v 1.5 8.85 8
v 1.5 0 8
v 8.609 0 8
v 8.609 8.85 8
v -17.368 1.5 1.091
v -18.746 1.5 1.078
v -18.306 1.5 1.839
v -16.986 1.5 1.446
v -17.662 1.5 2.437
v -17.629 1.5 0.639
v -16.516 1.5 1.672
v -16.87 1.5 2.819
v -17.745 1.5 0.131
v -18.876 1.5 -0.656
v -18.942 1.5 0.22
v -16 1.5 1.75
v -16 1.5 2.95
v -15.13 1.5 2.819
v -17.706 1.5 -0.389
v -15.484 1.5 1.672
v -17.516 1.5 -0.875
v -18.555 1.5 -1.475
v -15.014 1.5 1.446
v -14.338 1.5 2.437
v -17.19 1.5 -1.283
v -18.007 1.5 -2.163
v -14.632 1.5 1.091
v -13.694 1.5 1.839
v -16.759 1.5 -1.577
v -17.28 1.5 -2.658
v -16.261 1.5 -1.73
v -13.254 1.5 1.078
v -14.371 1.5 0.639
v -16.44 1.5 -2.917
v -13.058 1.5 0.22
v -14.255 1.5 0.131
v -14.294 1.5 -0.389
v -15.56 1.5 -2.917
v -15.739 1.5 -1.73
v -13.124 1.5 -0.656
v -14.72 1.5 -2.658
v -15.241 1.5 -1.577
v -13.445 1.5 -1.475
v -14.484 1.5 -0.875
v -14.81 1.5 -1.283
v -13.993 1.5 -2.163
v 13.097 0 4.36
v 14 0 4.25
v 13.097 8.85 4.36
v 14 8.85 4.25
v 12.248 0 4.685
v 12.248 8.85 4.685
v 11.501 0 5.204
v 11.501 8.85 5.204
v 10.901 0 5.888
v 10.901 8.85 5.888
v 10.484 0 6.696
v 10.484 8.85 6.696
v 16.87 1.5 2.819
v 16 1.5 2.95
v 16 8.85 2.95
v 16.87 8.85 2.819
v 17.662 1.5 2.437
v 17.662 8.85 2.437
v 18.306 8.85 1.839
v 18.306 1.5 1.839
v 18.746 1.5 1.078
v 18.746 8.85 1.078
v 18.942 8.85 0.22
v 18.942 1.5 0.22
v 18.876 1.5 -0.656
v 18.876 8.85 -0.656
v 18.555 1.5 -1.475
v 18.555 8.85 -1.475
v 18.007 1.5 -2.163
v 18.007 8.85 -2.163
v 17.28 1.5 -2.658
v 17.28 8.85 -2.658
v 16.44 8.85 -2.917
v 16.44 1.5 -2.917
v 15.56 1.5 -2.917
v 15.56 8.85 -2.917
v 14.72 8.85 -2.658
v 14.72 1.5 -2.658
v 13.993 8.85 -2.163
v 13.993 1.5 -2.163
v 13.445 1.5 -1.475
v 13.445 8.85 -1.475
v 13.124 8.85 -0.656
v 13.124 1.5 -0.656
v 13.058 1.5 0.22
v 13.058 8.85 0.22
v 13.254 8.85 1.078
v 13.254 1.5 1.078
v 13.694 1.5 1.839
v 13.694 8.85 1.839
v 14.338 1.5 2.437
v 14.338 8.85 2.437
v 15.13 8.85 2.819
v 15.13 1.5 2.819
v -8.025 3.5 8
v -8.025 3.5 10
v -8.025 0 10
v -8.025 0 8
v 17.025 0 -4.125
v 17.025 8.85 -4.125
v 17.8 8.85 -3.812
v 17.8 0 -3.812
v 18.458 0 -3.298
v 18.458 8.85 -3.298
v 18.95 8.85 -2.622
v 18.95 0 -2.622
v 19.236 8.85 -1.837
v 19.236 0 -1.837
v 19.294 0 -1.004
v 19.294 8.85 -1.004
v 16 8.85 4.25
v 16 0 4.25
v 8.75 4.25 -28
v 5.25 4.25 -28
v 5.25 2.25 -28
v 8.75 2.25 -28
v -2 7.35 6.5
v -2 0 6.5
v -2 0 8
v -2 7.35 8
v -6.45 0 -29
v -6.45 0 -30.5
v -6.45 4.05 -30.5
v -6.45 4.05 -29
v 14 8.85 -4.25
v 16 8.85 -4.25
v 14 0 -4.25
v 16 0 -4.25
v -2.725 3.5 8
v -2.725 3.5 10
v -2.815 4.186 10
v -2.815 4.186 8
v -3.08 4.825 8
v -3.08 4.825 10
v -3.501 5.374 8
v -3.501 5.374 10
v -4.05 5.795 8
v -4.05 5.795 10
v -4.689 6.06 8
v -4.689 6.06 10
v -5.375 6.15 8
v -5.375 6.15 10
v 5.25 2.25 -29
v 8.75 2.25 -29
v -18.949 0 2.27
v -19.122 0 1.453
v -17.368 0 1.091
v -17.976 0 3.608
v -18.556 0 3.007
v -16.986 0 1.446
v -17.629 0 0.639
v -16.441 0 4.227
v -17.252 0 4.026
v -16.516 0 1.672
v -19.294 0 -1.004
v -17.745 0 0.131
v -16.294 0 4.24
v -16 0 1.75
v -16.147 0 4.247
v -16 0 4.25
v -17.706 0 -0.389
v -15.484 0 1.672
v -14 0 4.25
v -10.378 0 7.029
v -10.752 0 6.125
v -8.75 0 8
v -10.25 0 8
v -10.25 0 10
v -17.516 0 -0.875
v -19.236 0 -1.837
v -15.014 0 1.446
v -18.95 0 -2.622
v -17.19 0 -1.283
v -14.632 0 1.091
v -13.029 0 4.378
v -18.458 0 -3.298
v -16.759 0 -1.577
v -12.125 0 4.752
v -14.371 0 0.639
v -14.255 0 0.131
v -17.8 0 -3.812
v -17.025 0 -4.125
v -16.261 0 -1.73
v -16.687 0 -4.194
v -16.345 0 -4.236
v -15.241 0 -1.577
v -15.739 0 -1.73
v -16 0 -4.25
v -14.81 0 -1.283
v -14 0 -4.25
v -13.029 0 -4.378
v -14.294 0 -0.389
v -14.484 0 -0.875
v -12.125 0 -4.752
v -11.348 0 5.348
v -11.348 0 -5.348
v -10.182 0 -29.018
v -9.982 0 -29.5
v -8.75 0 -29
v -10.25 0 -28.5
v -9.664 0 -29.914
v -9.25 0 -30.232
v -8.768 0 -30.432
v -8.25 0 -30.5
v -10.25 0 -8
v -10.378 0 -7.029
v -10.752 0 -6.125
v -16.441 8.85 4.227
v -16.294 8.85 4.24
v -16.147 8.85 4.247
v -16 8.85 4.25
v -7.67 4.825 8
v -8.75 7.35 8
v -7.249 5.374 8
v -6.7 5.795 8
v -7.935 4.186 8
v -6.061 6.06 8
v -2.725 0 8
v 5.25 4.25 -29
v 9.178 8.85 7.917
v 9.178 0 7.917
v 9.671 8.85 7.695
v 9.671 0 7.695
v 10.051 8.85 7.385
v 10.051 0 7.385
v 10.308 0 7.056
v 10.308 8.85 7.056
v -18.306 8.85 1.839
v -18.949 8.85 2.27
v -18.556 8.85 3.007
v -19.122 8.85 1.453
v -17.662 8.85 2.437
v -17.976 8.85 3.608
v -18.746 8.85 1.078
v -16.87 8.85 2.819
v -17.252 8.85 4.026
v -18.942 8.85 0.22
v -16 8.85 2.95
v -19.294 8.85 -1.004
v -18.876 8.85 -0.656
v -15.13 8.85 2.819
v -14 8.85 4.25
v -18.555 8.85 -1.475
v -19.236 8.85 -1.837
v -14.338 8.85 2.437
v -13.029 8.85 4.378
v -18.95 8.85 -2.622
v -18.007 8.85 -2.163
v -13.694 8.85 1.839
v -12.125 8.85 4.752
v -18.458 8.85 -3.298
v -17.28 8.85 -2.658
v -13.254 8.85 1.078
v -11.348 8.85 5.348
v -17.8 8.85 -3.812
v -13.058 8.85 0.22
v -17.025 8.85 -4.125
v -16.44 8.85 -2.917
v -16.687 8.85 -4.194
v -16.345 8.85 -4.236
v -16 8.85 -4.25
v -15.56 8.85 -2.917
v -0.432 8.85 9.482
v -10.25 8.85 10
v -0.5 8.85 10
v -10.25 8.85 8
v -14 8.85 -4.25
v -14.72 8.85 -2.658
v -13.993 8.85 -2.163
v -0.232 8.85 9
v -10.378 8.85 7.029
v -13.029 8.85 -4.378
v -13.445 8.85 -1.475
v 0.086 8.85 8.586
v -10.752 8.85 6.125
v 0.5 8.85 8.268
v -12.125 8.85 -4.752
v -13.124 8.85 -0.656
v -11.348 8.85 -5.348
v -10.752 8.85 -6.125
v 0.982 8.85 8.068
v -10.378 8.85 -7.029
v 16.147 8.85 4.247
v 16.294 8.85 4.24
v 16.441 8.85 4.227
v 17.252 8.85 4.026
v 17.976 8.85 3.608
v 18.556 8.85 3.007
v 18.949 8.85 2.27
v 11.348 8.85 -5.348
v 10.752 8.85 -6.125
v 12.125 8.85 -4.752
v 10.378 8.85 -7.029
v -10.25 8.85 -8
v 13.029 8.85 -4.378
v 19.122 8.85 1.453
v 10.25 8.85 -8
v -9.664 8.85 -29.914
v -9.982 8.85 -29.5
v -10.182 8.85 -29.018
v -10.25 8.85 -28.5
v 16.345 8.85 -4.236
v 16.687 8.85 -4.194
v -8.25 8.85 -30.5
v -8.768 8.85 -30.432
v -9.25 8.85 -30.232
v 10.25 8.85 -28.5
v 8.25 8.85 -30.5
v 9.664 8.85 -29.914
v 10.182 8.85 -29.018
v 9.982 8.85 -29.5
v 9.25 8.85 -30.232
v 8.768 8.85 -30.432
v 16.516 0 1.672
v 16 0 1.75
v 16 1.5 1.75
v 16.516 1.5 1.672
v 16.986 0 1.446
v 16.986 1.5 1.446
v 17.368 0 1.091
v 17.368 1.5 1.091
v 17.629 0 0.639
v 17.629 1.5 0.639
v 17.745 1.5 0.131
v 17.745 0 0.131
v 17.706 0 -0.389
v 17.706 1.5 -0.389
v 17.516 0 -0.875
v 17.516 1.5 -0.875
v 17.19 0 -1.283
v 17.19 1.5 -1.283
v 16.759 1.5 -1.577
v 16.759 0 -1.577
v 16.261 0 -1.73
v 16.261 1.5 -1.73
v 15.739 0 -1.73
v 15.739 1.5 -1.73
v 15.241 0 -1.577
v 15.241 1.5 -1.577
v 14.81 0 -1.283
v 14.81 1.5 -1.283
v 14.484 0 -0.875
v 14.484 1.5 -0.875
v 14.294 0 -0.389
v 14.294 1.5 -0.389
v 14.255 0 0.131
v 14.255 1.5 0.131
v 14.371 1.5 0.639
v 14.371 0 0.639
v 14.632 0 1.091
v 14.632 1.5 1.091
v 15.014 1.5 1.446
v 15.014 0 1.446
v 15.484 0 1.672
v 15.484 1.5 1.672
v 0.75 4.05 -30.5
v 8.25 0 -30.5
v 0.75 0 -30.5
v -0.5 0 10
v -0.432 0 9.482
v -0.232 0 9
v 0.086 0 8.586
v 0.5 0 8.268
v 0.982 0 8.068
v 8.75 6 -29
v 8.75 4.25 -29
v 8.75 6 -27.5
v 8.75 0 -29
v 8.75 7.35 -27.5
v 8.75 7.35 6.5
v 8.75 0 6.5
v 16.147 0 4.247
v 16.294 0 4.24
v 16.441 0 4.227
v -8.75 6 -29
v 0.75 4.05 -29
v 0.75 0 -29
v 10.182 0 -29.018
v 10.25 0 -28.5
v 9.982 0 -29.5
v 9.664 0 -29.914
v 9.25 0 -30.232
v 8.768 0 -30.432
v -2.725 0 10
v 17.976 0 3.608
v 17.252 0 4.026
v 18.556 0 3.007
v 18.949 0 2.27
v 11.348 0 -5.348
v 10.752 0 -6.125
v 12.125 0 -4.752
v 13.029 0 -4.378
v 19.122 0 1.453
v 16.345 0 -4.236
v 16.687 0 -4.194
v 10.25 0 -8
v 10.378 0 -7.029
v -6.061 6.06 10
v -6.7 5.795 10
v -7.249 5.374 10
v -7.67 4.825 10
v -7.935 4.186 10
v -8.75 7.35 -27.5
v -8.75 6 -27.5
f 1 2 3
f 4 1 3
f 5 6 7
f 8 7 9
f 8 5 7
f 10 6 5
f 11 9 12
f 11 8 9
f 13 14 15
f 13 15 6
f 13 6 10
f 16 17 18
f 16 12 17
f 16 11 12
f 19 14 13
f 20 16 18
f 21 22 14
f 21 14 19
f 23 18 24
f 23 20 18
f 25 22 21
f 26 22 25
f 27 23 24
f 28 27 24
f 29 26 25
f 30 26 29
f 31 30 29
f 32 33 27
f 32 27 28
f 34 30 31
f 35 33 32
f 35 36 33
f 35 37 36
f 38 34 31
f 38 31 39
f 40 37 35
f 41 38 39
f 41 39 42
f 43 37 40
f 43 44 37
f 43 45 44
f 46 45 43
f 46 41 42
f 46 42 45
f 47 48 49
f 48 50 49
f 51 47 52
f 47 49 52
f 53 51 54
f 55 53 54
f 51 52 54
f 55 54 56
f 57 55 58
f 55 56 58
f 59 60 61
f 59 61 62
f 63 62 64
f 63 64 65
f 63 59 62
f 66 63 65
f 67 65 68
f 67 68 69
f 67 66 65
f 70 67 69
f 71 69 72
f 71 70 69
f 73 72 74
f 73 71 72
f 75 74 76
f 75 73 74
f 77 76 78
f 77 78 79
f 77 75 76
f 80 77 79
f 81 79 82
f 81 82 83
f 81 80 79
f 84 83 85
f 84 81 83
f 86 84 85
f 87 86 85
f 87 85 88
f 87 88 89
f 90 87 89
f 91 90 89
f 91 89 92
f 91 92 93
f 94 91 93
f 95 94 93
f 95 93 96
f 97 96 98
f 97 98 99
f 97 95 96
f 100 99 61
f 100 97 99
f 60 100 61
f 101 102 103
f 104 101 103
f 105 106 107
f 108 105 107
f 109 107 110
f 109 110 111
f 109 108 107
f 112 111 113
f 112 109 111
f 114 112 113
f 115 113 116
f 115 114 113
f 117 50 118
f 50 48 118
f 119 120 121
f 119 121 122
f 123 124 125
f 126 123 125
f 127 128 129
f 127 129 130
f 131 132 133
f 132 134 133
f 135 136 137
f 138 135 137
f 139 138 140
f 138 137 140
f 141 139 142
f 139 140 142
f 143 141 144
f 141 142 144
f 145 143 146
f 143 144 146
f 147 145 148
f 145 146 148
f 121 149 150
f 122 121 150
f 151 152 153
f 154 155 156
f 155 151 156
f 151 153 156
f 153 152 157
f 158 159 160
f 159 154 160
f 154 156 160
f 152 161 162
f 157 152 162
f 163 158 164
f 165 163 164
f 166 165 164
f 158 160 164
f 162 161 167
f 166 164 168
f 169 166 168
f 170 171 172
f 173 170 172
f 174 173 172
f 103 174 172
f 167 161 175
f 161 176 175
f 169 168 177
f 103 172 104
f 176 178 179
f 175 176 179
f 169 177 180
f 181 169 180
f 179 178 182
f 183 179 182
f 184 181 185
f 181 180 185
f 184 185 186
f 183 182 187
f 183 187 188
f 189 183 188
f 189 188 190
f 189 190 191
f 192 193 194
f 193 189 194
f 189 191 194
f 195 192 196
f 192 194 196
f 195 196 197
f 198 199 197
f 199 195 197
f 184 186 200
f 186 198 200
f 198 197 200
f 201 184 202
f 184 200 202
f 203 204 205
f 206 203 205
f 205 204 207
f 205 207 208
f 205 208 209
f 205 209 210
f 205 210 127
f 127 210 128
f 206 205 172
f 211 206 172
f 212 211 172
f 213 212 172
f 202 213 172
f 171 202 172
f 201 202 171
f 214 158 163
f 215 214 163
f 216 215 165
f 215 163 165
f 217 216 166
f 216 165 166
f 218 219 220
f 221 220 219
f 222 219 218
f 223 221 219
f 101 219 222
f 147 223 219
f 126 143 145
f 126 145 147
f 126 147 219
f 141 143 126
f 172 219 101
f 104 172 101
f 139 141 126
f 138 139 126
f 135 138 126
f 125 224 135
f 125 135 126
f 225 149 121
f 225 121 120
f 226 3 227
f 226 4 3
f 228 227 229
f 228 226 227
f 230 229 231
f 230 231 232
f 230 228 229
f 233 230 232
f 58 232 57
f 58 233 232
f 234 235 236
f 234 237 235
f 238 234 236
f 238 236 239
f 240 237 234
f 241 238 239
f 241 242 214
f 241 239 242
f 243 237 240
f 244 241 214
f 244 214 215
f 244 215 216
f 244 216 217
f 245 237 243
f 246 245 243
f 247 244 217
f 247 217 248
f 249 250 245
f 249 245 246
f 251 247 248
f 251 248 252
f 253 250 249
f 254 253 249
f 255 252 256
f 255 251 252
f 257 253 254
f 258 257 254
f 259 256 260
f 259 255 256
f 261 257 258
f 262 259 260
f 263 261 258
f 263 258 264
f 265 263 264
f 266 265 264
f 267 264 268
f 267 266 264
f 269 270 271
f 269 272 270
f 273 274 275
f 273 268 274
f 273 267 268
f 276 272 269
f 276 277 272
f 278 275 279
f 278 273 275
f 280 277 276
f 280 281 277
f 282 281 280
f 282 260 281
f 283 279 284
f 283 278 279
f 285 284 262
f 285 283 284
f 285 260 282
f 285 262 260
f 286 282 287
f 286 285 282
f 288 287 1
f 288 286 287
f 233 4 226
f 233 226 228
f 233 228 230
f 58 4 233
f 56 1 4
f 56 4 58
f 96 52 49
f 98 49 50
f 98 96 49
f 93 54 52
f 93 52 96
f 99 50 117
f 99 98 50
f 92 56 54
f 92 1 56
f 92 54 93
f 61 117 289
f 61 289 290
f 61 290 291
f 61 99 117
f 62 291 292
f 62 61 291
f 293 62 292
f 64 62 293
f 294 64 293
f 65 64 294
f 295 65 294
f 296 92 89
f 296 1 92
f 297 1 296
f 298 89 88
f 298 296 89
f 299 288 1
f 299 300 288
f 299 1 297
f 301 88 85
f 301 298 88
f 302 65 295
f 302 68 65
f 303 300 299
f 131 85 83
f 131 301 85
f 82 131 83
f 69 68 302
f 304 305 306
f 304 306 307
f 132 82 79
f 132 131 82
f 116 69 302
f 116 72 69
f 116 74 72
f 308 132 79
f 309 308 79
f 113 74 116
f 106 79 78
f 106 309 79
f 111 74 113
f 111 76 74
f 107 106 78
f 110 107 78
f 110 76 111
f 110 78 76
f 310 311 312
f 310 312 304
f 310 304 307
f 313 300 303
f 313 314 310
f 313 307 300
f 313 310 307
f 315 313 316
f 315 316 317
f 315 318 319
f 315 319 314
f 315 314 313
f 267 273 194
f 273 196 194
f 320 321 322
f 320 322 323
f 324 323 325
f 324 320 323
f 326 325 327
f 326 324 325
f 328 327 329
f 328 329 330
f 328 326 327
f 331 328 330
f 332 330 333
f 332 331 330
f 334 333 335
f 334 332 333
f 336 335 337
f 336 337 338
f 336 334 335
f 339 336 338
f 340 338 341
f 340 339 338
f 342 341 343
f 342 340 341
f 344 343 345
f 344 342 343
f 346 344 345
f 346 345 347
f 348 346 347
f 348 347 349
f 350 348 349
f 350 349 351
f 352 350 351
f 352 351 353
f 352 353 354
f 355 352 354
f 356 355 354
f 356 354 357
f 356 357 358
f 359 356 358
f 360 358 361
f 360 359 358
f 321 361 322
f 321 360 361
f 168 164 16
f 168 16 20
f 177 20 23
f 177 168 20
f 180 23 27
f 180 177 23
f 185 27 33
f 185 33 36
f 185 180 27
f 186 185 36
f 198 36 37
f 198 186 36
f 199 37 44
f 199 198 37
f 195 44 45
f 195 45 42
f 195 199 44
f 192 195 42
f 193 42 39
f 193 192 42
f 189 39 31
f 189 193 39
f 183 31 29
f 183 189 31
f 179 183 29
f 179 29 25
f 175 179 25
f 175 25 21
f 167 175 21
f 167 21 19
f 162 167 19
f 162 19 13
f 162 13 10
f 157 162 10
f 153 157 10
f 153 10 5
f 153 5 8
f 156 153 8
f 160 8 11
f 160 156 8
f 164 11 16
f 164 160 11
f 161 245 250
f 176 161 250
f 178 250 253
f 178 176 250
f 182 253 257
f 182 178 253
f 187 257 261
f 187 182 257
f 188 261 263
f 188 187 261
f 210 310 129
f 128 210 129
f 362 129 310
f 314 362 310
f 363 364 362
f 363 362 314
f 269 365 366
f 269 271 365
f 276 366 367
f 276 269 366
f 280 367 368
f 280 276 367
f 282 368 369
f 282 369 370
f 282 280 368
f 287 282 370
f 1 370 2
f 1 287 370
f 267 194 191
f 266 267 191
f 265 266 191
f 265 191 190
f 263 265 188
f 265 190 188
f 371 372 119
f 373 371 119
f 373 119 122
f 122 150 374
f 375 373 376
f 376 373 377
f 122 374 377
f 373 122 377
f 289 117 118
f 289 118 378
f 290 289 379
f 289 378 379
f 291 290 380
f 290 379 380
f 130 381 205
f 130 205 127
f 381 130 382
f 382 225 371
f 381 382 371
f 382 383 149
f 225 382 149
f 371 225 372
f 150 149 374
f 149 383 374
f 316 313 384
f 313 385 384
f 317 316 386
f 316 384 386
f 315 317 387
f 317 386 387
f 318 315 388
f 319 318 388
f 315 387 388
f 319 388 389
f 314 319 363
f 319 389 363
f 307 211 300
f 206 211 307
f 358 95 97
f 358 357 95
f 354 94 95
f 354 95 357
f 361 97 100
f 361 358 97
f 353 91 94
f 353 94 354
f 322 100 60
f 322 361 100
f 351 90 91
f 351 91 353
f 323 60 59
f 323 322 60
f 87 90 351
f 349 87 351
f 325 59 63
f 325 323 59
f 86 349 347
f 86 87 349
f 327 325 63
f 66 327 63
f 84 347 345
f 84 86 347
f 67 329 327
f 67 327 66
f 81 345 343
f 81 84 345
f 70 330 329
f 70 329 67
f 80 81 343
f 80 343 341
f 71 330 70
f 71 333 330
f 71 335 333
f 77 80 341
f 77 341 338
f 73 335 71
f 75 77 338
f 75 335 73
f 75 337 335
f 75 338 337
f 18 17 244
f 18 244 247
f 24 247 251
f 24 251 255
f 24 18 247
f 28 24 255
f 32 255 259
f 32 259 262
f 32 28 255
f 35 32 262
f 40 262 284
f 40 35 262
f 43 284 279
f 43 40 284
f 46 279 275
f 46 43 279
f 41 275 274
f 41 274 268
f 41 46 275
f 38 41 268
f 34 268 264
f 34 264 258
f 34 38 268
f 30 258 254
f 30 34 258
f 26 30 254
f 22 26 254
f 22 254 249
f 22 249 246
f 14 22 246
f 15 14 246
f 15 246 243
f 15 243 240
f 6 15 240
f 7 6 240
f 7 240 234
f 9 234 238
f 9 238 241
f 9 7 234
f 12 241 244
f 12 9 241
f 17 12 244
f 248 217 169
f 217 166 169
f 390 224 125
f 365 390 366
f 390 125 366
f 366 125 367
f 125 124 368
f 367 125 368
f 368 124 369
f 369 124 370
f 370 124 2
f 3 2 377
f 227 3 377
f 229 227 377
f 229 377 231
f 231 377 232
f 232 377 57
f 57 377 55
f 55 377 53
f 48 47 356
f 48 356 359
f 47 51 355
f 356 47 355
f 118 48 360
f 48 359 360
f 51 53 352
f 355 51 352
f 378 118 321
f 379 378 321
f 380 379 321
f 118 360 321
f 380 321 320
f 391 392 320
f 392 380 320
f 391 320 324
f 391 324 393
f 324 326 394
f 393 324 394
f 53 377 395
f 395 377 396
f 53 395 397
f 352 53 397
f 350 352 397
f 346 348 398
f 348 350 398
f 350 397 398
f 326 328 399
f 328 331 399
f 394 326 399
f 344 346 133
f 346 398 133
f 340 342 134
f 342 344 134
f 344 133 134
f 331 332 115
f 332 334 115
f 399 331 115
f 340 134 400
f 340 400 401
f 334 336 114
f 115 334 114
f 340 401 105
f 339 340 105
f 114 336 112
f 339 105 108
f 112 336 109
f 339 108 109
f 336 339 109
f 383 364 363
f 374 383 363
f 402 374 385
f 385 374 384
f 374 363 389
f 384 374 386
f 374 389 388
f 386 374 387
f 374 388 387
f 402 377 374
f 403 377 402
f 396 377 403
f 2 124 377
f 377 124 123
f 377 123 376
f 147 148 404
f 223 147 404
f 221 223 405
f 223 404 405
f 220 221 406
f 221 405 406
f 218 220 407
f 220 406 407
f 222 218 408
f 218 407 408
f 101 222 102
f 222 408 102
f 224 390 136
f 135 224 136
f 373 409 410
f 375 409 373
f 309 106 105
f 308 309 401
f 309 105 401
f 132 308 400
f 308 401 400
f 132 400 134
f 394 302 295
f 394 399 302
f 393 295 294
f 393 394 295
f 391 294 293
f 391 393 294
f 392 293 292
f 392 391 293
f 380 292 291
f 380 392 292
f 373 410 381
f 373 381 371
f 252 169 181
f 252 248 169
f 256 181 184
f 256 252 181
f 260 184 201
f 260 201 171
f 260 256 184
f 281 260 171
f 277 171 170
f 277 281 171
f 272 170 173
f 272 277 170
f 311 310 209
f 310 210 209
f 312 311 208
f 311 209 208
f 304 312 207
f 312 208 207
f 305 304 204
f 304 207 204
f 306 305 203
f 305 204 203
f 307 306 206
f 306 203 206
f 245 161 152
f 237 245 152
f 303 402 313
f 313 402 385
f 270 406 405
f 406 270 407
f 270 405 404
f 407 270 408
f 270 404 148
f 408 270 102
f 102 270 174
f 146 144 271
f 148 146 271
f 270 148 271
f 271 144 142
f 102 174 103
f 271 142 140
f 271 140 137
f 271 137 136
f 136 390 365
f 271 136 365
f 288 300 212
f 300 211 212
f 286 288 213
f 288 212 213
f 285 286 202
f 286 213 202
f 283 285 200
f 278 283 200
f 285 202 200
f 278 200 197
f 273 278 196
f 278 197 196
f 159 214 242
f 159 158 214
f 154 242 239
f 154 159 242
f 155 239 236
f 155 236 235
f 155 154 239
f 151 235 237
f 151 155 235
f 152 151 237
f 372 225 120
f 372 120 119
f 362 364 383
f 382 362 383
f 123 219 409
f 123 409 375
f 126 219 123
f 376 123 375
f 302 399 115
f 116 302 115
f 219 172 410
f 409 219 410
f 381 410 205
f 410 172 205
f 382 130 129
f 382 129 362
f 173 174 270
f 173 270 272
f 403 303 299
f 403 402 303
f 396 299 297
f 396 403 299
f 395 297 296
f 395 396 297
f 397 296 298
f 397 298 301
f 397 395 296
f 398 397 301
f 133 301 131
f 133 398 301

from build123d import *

# Parameters (mm, degrees)
SKETCH1_W           = 20.5
SKETCH1_H           = 38.5
SKETCH1_R           = 4.25
SKETCH1_R_2         = 1.75
BOSS_EXTRUDE1_DEPTH = 1.5
SKETCH2_W           = 20.5
SKETCH2_H           = 38.5
BOSS_EXTRUDE2_DEPTH = 7.35
SKETCH3_W           = 17.5
SKETCH3_H           = 35.5
SKETCH3_W_2         = 6.75
SKETCH3_H_2         = 1.5
CUT_EXTRUDE1_DEPTH  = 7.35
SKETCH4_W           = 7.2
SKETCH4_H           = 1.5
CUT_EXTRUDE2_DEPTH  = 4.05
SKETCH6_W           = 17.5
SKETCH6_H           = 1.5
BOSS_EXTRUDE3_DEPTH = 1.35
SKETCH7_W           = 3.5
SKETCH7_H           = 2
BOSS_EXTRUDE4_DEPTH = 1
SKETCH8_R           = 2.95
BOSS_EXTRUDE5_DEPTH = 7.35
FILLET2_R           = 3.75
CUT_EXTRUDE4_START  = -8.85
CUT_EXTRUDE4_DEPTH  = 8.85
FILLET5_R           = 3
SKETCH10_W          = 9.75
SKETCH10_H          = 2
BOSS_EXTRUDE6_DEPTH = 8.85
CUT_EXTRUDE5_REACH  = 47.729
FILLET4_R           = 2


with BuildPart() as part:
    # Sketch1 → Boss-Extrude1 (new body)
    # profile 1 of 5: a face of its own
    with BuildSketch(Plane(origin=(0, 0, 0), x_dir=(1, 0, 0), z_dir=(0, 1, 0))):
        with Locations((0, 11.25)):
            Rectangle(SKETCH1_W, SKETCH1_H)
    # profile 2 of 5: a face of its own
    with BuildSketch(Plane(origin=(0, 0, 0), x_dir=(1, 0, 0), z_dir=(0, 1, 0))):
        with BuildLine():
            Line((-10.25, -4.25), (-10.25, 4.25))
            Line((-10.25, 4.25), (-16, 4.25))
            ThreePointArc((-16, 4.25), (-12.99479618, 3.00520382), (-11.75, 0))
            ThreePointArc((-11.75, 0), (-12.99479618, -3.00520382), (-16, -4.25))
            Line((-16, -4.25), (-10.25, -4.25))
        make_face()
    # profile 3 of 5: a face of its own
    with BuildSketch(Plane(origin=(0, 0, 0), x_dir=(1, 0, 0), z_dir=(0, 1, 0))):
        with Locations((-16, 0)):
            Circle(SKETCH1_R)
        with Locations(Location((-16, 0, 0), (0, 0, 270))):
            Circle(SKETCH1_R_2, mode=Mode.SUBTRACT)
    # profile 4 of 5: a face of its own
    with BuildSketch(Plane(origin=(0, 0, 0), x_dir=(1, 0, 0), z_dir=(0, 1, 0))):
        with BuildLine():
            Line((16, 4.25), (10.25, 4.25))
            Line((10.25, 4.25), (10.25, -4.25))
            Line((10.25, -4.25), (16, -4.25))
            ThreePointArc((16, -4.25), (11.75, 0), (16, 4.25))
        make_face()
    # profile 5 of 5: a face of its own
    with BuildSketch(Plane(origin=(0, 0, 0), x_dir=(1, 0, 0), z_dir=(0, 1, 0))):
        with Locations((16, 0)):
            Circle(SKETCH1_R)
        with Locations(Location((16, 0, 0), (0, 0, 270))):
            Circle(SKETCH1_R_2, mode=Mode.SUBTRACT)
    extrude(amount=BOSS_EXTRUDE1_DEPTH)

    # Sketch2 → Boss-Extrude2 (add)
    with BuildSketch(Plane(origin=(0, 1.5, 0), x_dir=(1, 0, 0), z_dir=(0, 1, 0))):
        with Locations((0, 11.25)):
            Rectangle(SKETCH2_W, SKETCH2_H)
    extrude(amount=BOSS_EXTRUDE2_DEPTH)

    # Sketch3 → Cut-Extrude1 (cut)
    with BuildSketch(Plane.XZ):
        with Locations((0, -11.25)):
            Rectangle(SKETCH3_W, SKETCH3_H)
        with Locations((-5.375, 7.25)):
            Rectangle(SKETCH3_W_2, SKETCH3_H_2)
    extrude(amount=-CUT_EXTRUDE1_DEPTH, mode=Mode.SUBTRACT)

    # Sketch4 → Cut-Extrude2 (cut)
    with BuildSketch(Plane.XZ):
        with Locations((-2.85, -29.75)):
            Rectangle(SKETCH4_W, SKETCH4_H)
    extrude(amount=-CUT_EXTRUDE2_DEPTH, mode=Mode.SUBTRACT)

    # Sketch6 → Boss-Extrude3 (add)
    with BuildSketch(Plane.XZ.offset(-7.35)):
        with Locations((0, -28.25)):
            Rectangle(SKETCH6_W, SKETCH6_H)
    extrude(amount=BOSS_EXTRUDE3_DEPTH)

    # Sketch7 → Boss-Extrude4 (add)
    with BuildSketch(Plane.XY.offset(-29)):
        with Locations((7, 3.25)):
            Rectangle(SKETCH7_W, SKETCH7_H)
    extrude(amount=BOSS_EXTRUDE4_DEPTH)

    # Sketch8 → Boss-Extrude5 (add)
    # profile 1 of 2: a face of its own
    with BuildSketch(Plane(origin=(0, 1.5, 0), x_dir=(1, 0, 0), z_dir=(0, 1, 0))):
        with BuildLine():
            Line((-10.25, -4.25), (-10.25, 4.25))
            Line((-10.25, 4.25), (-16, 4.25))
            ThreePointArc((-16, 4.25), (-20.25, 0), (-16, -4.25))
            Line((-16, -4.25), (-10.25, -4.25))
        make_face()
        with Locations(Location((-16, 0, 0), (0, 0, 270))):
            Circle(SKETCH8_R, mode=Mode.SUBTRACT)
    # profile 2 of 2: a face of its own
    with BuildSketch(Plane(origin=(0, 1.5, 0), x_dir=(1, 0, 0), z_dir=(0, 1, 0))):
        with BuildLine():
            Line((10.25, 4.25), (10.25, -4.25))
            Line((10.25, -4.25), (16, -4.25))
            ThreePointArc((16, -4.25), (20.25, 0), (16, 4.25))
            Line((16, 4.25), (10.25, 4.25))
        make_face()
        with Locations(Location((16, 0, 0), (0, 0, 270))):
            Circle(SKETCH8_R, mode=Mode.SUBTRACT)
    extrude(amount=BOSS_EXTRUDE5_DEPTH)

    # Fillet2
    fillet2_edges = [part.edges().sort_by_distance(p)[0] for p in [
        (10.25, 4.425, -4.25),
        (10.25, 4.425, 4.25),
        (-10.25, 4.425, 4.25),
        (-10.25, 4.425, -4.25),
    ]]
    fillet(fillet2_edges, radius=FILLET2_R - 0.0001)  # a hair under: the kernel refuses the full size

    # Sketch9 → Cut-Extrude4 (cut)
    with BuildSketch(Plane(origin=(0, 8.85, 0), x_dir=(1, 0, 0), z_dir=(0, 1, 0)).offset(CUT_EXTRUDE4_START)):
        with BuildLine():
            Line((-24.982948352, 53.686308531), (-20.952771504, -3.947905519))
            ThreePointArc((-20.952771504, -3.947905519), (-19.171836931, -8.143524448), (-15.185360396, -10.353264474))
            Line((-15.185360396, -10.353264474), (-1.215537244, -12.816521212))
            ThreePointArc((-1.215537244, -12.816521212), (0, -12.922866941), (1.215537244, -12.816521212))
            Line((1.215537244, -12.816521212), (15.185360396, -10.353264474))
            ThreePointArc((15.185360396, -10.353264474), (19.171836931, -8.143524448), (20.952771504, -3.947905519))
            Line((20.952771504, -3.947905519), (24.982948352, 53.686308531))
            ThreePointArc((24.982948352, 53.686308531), (24.995735789, 53.930307371), (25, 54.174603847))
            Line((25, 54.174603847), (25, 107.825396153))
            ThreePointArc((25, 107.825396153), (24.995735789, 108.069692629), (24.982948352, 108.313691469))
            Line((24.982948352, 108.313691469), (20.952771504, 165.947905519))
            ThreePointArc((20.952771504, 165.947905519), (19.171836931, 170.143524448), (15.185360396, 172.353264474))
            Line((15.185360396, 172.353264474), (1.215537244, 174.816521212))
            ThreePointArc((1.215537244, 174.816521212), (0, 174.922866941), (-1.215537244, 174.816521212))
            Line((-1.215537244, 174.816521212), (-15.185360396, 172.353264474))
            ThreePointArc((-15.185360396, 172.353264474), (-19.171836931, 170.143524448), (-20.952771504, 165.947905519))
            Line((-20.952771504, 165.947905519), (-24.982948352, 108.313691469))
            ThreePointArc((-24.982948352, 108.313691469), (-24.995735789, 108.069692629), (-25, 107.825396153))
            Line((-25, 107.825396153), (-25, 54.174603847))
            ThreePointArc((-25, 54.174603847), (-24.995735789, 53.930307371), (-24.982948352, 53.686308531))
        make_face()
        with BuildLine():
            Line((-18.957643404, 165.808392572), (-22.987820251, 108.174178521))
            ThreePointArc((-22.987820251, 108.174178521), (-22.996954135, 107.999893636), (-23, 107.825396153))
            Line((-23, 107.825396153), (-23, 54.174603847))
            ThreePointArc((-23, 54.174603847), (-22.996954135, 54.000106364), (-22.987820251, 53.825821479))
            Line((-22.987820251, 53.825821479), (-18.957643404, -3.808392572))
            ThreePointArc((-18.957643404, -3.808392572), (-17.68554728, -6.805263235), (-14.838064041, -8.383648968))
            Line((-14.838064041, -8.383648968), (-0.868240888, -10.846905706))
            ThreePointArc((-0.868240888, -10.846905706), (0, -10.922866941), (0.868240888, -10.846905706))
            Line((0.868240888, -10.846905706), (14.838064041, -8.383648968))
            ThreePointArc((14.838064041, -8.383648968), (17.68554728, -6.805263235), (18.957643404, -3.808392572))
            Line((18.957643404, -3.808392572), (22.987820251, 53.825821479))
            ThreePointArc((22.987820251, 53.825821479), (22.996954135, 54.000106364), (23, 54.174603847))
            Line((23, 54.174603847), (23, 107.825396153))
            ThreePointArc((23, 107.825396153), (22.996954135, 107.999893636), (22.987820251, 108.174178521))
            Line((22.987820251, 108.174178521), (18.957643404, 165.808392572))
            ThreePointArc((18.957643404, 165.808392572), (17.68554728, 168.805263235), (14.838064041, 170.383648968))
            Line((14.838064041, 170.383648968), (0.868240888, 172.846905706))
            ThreePointArc((0.868240888, 172.846905706), (0, 172.922866941), (-0.868240888, 172.846905706))
            Line((-0.868240888, 172.846905706), (-14.838064041, 170.383648968))
            ThreePointArc((-14.838064041, 170.383648968), (-17.68554728, 168.805263235), (-18.957643404, 165.808392572))
        make_face(mode=Mode.SUBTRACT)
    extrude(amount=CUT_EXTRUDE4_DEPTH, mode=Mode.SUBTRACT)

    # Fillet5
    fillet5_edges = [part.edges().sort_by_distance(p)[0] for p in [
        (-19.402072162, 4.425, -2.547234776),
        (-19.014456867, 4.425, 2.995922195),
        (19.014456867, 4.425, 2.995922195),
        (19.402072162, 4.425, -2.547234776),
    ]]
    fillet(fillet5_edges, radius=FILLET5_R)

    # Sketch10 → Boss-Extrude6 (add)
    with BuildSketch(Plane(origin=(0, 0, 0), x_dir=(1, 0, 0), z_dir=(0, 1, 0))):
        with Locations((-5.375, -9)):
            Rectangle(SKETCH10_W, SKETCH10_H)
    extrude(amount=BOSS_EXTRUDE6_DEPTH)

    # Sketch11 → Cut-Extrude5 (cut, up to next)
    with BuildSketch(Plane.XY.offset(10), mode=Mode.PRIVATE) as cut_extrude5_sk1:
        with BuildLine():
            ThreePointArc((-2.725, 3.5), (-3.50116703, 5.37383297), (-5.375, 6.15))
            Line((-5.375, 6.15), (-5.375, 0.85))
            ThreePointArc((-5.375, 0.85), (-3.50116703, 1.62616703), (-2.725, 3.5))
        make_face()
    cut_extrude5_tool1 = extrude(cut_extrude5_sk1.sketch, amount=-CUT_EXTRUDE5_REACH, mode=Mode.PRIVATE) & part.part
    # Sketch11 → Cut-Extrude5 (cut, up to next)
    with BuildSketch(Plane.XY.offset(10), mode=Mode.PRIVATE) as cut_extrude5_sk2:
        with BuildLine():
            Line((-5.375, 0.85), (-5.375, 6.15))
            ThreePointArc((-5.375, 6.15), (-7.24883297, 5.37383297), (-8.025, 3.5))
            ThreePointArc((-8.025, 3.5), (-7.24883297, 1.62616703), (-5.375, 0.85))
        make_face()
    cut_extrude5_tool2 = extrude(cut_extrude5_sk2.sketch, amount=-CUT_EXTRUDE5_REACH, mode=Mode.PRIVATE) & part.part
    # Sketch11 → Cut-Extrude5 (cut, up to next)
    with BuildSketch(Plane.XY.offset(10), mode=Mode.PRIVATE) as cut_extrude5_sk3:
        with BuildLine():
            ThreePointArc((-2.725, 3.5), (-3.50116703, 5.37383297), (-5.375, 6.15))
            Line((-5.375, 6.15), (-5.375, 0.85))
            ThreePointArc((-5.375, 0.85), (-3.50116703, 1.62616703), (-2.725, 3.5))
        make_face()
    cut_extrude5_tool3 = extrude(cut_extrude5_sk3.sketch, amount=-CUT_EXTRUDE5_REACH, mode=Mode.PRIVATE) & part.part
    # Sketch11 → Cut-Extrude5 (cut, up to next)
    with BuildSketch(Plane.XY.offset(10), mode=Mode.PRIVATE) as cut_extrude5_sk4:
        with BuildLine():
            Line((-5.375, 0.85), (-5.375, 6.15))
            ThreePointArc((-5.375, 6.15), (-7.24883297, 5.37383297), (-8.025, 3.5))
            ThreePointArc((-8.025, 3.5), (-7.24883297, 1.62616703), (-5.375, 0.85))
        make_face()
    cut_extrude5_tool4 = extrude(cut_extrude5_sk4.sketch, amount=-CUT_EXTRUDE5_REACH, mode=Mode.PRIVATE) & part.part
    # Sketch11 → Cut-Extrude5 (cut, up to next)
    with BuildSketch(Plane.XY.offset(10), mode=Mode.PRIVATE) as cut_extrude5_sk5:
        with BuildLine():
            Line((-5.375, 0), (-5.375, 0.85))
            ThreePointArc((-5.375, 0.85), (-7.24883297, 1.62616703), (-8.025, 3.5))
            Line((-8.025, 3.5), (-8.025, 0))
            Line((-8.025, 0), (-5.375, 0))
        make_face()
    cut_extrude5_tool5 = extrude(cut_extrude5_sk5.sketch, amount=-CUT_EXTRUDE5_REACH, mode=Mode.PRIVATE) & part.part
    # Sketch11 → Cut-Extrude5 (cut, up to next)
    with BuildSketch(Plane.XY.offset(10), mode=Mode.PRIVATE) as cut_extrude5_sk6:
        with BuildLine():
            ThreePointArc((-2.725, 3.5), (-3.50116703, 1.62616703), (-5.375, 0.85))
            Line((-5.375, 0.85), (-5.375, 0))
            Line((-5.375, 0), (-2.725, 0))
            Line((-2.725, 0), (-2.725, 3.5))
        make_face()
    cut_extrude5_tool6 = extrude(cut_extrude5_sk6.sketch, amount=-CUT_EXTRUDE5_REACH, mode=Mode.PRIVATE) & part.part
    add(cut_extrude5_tool1.solids().sort_by_distance((-4.250305, 3.5, 10))[0], mode=Mode.SUBTRACT)
    add(cut_extrude5_tool2.solids().sort_by_distance((-6.499695, 3.5, 10))[0], mode=Mode.SUBTRACT)
    add(cut_extrude5_tool3.solids().sort_by_distance((-4.250305, 3.5, 10))[0], mode=Mode.SUBTRACT)
    add(cut_extrude5_tool4.solids().sort_by_distance((-6.499695, 3.5, 10))[0], mode=Mode.SUBTRACT)
    add(cut_extrude5_tool5.solids().sort_by_distance((-6.993859, 0.832642, 10))[0], mode=Mode.SUBTRACT)
    add(cut_extrude5_tool6.solids().sort_by_distance((-3.756141, 0.832642, 10))[0], mode=Mode.SUBTRACT)

    # Fillet4
    fillet4_edges = [part.edges().sort_by_distance(p)[0] for p in [
        (10.25, 4.425, 8),
        (10.25, 4.425, -30.5),
        (-10.25, 4.425, -30.5),
        (-0.5, 4.425, 8),
    ]]
    fillet(fillet4_edges, radius=FILLET4_R - 0.0001)  # a hair under: the kernel refuses the full size


solid = part.part
